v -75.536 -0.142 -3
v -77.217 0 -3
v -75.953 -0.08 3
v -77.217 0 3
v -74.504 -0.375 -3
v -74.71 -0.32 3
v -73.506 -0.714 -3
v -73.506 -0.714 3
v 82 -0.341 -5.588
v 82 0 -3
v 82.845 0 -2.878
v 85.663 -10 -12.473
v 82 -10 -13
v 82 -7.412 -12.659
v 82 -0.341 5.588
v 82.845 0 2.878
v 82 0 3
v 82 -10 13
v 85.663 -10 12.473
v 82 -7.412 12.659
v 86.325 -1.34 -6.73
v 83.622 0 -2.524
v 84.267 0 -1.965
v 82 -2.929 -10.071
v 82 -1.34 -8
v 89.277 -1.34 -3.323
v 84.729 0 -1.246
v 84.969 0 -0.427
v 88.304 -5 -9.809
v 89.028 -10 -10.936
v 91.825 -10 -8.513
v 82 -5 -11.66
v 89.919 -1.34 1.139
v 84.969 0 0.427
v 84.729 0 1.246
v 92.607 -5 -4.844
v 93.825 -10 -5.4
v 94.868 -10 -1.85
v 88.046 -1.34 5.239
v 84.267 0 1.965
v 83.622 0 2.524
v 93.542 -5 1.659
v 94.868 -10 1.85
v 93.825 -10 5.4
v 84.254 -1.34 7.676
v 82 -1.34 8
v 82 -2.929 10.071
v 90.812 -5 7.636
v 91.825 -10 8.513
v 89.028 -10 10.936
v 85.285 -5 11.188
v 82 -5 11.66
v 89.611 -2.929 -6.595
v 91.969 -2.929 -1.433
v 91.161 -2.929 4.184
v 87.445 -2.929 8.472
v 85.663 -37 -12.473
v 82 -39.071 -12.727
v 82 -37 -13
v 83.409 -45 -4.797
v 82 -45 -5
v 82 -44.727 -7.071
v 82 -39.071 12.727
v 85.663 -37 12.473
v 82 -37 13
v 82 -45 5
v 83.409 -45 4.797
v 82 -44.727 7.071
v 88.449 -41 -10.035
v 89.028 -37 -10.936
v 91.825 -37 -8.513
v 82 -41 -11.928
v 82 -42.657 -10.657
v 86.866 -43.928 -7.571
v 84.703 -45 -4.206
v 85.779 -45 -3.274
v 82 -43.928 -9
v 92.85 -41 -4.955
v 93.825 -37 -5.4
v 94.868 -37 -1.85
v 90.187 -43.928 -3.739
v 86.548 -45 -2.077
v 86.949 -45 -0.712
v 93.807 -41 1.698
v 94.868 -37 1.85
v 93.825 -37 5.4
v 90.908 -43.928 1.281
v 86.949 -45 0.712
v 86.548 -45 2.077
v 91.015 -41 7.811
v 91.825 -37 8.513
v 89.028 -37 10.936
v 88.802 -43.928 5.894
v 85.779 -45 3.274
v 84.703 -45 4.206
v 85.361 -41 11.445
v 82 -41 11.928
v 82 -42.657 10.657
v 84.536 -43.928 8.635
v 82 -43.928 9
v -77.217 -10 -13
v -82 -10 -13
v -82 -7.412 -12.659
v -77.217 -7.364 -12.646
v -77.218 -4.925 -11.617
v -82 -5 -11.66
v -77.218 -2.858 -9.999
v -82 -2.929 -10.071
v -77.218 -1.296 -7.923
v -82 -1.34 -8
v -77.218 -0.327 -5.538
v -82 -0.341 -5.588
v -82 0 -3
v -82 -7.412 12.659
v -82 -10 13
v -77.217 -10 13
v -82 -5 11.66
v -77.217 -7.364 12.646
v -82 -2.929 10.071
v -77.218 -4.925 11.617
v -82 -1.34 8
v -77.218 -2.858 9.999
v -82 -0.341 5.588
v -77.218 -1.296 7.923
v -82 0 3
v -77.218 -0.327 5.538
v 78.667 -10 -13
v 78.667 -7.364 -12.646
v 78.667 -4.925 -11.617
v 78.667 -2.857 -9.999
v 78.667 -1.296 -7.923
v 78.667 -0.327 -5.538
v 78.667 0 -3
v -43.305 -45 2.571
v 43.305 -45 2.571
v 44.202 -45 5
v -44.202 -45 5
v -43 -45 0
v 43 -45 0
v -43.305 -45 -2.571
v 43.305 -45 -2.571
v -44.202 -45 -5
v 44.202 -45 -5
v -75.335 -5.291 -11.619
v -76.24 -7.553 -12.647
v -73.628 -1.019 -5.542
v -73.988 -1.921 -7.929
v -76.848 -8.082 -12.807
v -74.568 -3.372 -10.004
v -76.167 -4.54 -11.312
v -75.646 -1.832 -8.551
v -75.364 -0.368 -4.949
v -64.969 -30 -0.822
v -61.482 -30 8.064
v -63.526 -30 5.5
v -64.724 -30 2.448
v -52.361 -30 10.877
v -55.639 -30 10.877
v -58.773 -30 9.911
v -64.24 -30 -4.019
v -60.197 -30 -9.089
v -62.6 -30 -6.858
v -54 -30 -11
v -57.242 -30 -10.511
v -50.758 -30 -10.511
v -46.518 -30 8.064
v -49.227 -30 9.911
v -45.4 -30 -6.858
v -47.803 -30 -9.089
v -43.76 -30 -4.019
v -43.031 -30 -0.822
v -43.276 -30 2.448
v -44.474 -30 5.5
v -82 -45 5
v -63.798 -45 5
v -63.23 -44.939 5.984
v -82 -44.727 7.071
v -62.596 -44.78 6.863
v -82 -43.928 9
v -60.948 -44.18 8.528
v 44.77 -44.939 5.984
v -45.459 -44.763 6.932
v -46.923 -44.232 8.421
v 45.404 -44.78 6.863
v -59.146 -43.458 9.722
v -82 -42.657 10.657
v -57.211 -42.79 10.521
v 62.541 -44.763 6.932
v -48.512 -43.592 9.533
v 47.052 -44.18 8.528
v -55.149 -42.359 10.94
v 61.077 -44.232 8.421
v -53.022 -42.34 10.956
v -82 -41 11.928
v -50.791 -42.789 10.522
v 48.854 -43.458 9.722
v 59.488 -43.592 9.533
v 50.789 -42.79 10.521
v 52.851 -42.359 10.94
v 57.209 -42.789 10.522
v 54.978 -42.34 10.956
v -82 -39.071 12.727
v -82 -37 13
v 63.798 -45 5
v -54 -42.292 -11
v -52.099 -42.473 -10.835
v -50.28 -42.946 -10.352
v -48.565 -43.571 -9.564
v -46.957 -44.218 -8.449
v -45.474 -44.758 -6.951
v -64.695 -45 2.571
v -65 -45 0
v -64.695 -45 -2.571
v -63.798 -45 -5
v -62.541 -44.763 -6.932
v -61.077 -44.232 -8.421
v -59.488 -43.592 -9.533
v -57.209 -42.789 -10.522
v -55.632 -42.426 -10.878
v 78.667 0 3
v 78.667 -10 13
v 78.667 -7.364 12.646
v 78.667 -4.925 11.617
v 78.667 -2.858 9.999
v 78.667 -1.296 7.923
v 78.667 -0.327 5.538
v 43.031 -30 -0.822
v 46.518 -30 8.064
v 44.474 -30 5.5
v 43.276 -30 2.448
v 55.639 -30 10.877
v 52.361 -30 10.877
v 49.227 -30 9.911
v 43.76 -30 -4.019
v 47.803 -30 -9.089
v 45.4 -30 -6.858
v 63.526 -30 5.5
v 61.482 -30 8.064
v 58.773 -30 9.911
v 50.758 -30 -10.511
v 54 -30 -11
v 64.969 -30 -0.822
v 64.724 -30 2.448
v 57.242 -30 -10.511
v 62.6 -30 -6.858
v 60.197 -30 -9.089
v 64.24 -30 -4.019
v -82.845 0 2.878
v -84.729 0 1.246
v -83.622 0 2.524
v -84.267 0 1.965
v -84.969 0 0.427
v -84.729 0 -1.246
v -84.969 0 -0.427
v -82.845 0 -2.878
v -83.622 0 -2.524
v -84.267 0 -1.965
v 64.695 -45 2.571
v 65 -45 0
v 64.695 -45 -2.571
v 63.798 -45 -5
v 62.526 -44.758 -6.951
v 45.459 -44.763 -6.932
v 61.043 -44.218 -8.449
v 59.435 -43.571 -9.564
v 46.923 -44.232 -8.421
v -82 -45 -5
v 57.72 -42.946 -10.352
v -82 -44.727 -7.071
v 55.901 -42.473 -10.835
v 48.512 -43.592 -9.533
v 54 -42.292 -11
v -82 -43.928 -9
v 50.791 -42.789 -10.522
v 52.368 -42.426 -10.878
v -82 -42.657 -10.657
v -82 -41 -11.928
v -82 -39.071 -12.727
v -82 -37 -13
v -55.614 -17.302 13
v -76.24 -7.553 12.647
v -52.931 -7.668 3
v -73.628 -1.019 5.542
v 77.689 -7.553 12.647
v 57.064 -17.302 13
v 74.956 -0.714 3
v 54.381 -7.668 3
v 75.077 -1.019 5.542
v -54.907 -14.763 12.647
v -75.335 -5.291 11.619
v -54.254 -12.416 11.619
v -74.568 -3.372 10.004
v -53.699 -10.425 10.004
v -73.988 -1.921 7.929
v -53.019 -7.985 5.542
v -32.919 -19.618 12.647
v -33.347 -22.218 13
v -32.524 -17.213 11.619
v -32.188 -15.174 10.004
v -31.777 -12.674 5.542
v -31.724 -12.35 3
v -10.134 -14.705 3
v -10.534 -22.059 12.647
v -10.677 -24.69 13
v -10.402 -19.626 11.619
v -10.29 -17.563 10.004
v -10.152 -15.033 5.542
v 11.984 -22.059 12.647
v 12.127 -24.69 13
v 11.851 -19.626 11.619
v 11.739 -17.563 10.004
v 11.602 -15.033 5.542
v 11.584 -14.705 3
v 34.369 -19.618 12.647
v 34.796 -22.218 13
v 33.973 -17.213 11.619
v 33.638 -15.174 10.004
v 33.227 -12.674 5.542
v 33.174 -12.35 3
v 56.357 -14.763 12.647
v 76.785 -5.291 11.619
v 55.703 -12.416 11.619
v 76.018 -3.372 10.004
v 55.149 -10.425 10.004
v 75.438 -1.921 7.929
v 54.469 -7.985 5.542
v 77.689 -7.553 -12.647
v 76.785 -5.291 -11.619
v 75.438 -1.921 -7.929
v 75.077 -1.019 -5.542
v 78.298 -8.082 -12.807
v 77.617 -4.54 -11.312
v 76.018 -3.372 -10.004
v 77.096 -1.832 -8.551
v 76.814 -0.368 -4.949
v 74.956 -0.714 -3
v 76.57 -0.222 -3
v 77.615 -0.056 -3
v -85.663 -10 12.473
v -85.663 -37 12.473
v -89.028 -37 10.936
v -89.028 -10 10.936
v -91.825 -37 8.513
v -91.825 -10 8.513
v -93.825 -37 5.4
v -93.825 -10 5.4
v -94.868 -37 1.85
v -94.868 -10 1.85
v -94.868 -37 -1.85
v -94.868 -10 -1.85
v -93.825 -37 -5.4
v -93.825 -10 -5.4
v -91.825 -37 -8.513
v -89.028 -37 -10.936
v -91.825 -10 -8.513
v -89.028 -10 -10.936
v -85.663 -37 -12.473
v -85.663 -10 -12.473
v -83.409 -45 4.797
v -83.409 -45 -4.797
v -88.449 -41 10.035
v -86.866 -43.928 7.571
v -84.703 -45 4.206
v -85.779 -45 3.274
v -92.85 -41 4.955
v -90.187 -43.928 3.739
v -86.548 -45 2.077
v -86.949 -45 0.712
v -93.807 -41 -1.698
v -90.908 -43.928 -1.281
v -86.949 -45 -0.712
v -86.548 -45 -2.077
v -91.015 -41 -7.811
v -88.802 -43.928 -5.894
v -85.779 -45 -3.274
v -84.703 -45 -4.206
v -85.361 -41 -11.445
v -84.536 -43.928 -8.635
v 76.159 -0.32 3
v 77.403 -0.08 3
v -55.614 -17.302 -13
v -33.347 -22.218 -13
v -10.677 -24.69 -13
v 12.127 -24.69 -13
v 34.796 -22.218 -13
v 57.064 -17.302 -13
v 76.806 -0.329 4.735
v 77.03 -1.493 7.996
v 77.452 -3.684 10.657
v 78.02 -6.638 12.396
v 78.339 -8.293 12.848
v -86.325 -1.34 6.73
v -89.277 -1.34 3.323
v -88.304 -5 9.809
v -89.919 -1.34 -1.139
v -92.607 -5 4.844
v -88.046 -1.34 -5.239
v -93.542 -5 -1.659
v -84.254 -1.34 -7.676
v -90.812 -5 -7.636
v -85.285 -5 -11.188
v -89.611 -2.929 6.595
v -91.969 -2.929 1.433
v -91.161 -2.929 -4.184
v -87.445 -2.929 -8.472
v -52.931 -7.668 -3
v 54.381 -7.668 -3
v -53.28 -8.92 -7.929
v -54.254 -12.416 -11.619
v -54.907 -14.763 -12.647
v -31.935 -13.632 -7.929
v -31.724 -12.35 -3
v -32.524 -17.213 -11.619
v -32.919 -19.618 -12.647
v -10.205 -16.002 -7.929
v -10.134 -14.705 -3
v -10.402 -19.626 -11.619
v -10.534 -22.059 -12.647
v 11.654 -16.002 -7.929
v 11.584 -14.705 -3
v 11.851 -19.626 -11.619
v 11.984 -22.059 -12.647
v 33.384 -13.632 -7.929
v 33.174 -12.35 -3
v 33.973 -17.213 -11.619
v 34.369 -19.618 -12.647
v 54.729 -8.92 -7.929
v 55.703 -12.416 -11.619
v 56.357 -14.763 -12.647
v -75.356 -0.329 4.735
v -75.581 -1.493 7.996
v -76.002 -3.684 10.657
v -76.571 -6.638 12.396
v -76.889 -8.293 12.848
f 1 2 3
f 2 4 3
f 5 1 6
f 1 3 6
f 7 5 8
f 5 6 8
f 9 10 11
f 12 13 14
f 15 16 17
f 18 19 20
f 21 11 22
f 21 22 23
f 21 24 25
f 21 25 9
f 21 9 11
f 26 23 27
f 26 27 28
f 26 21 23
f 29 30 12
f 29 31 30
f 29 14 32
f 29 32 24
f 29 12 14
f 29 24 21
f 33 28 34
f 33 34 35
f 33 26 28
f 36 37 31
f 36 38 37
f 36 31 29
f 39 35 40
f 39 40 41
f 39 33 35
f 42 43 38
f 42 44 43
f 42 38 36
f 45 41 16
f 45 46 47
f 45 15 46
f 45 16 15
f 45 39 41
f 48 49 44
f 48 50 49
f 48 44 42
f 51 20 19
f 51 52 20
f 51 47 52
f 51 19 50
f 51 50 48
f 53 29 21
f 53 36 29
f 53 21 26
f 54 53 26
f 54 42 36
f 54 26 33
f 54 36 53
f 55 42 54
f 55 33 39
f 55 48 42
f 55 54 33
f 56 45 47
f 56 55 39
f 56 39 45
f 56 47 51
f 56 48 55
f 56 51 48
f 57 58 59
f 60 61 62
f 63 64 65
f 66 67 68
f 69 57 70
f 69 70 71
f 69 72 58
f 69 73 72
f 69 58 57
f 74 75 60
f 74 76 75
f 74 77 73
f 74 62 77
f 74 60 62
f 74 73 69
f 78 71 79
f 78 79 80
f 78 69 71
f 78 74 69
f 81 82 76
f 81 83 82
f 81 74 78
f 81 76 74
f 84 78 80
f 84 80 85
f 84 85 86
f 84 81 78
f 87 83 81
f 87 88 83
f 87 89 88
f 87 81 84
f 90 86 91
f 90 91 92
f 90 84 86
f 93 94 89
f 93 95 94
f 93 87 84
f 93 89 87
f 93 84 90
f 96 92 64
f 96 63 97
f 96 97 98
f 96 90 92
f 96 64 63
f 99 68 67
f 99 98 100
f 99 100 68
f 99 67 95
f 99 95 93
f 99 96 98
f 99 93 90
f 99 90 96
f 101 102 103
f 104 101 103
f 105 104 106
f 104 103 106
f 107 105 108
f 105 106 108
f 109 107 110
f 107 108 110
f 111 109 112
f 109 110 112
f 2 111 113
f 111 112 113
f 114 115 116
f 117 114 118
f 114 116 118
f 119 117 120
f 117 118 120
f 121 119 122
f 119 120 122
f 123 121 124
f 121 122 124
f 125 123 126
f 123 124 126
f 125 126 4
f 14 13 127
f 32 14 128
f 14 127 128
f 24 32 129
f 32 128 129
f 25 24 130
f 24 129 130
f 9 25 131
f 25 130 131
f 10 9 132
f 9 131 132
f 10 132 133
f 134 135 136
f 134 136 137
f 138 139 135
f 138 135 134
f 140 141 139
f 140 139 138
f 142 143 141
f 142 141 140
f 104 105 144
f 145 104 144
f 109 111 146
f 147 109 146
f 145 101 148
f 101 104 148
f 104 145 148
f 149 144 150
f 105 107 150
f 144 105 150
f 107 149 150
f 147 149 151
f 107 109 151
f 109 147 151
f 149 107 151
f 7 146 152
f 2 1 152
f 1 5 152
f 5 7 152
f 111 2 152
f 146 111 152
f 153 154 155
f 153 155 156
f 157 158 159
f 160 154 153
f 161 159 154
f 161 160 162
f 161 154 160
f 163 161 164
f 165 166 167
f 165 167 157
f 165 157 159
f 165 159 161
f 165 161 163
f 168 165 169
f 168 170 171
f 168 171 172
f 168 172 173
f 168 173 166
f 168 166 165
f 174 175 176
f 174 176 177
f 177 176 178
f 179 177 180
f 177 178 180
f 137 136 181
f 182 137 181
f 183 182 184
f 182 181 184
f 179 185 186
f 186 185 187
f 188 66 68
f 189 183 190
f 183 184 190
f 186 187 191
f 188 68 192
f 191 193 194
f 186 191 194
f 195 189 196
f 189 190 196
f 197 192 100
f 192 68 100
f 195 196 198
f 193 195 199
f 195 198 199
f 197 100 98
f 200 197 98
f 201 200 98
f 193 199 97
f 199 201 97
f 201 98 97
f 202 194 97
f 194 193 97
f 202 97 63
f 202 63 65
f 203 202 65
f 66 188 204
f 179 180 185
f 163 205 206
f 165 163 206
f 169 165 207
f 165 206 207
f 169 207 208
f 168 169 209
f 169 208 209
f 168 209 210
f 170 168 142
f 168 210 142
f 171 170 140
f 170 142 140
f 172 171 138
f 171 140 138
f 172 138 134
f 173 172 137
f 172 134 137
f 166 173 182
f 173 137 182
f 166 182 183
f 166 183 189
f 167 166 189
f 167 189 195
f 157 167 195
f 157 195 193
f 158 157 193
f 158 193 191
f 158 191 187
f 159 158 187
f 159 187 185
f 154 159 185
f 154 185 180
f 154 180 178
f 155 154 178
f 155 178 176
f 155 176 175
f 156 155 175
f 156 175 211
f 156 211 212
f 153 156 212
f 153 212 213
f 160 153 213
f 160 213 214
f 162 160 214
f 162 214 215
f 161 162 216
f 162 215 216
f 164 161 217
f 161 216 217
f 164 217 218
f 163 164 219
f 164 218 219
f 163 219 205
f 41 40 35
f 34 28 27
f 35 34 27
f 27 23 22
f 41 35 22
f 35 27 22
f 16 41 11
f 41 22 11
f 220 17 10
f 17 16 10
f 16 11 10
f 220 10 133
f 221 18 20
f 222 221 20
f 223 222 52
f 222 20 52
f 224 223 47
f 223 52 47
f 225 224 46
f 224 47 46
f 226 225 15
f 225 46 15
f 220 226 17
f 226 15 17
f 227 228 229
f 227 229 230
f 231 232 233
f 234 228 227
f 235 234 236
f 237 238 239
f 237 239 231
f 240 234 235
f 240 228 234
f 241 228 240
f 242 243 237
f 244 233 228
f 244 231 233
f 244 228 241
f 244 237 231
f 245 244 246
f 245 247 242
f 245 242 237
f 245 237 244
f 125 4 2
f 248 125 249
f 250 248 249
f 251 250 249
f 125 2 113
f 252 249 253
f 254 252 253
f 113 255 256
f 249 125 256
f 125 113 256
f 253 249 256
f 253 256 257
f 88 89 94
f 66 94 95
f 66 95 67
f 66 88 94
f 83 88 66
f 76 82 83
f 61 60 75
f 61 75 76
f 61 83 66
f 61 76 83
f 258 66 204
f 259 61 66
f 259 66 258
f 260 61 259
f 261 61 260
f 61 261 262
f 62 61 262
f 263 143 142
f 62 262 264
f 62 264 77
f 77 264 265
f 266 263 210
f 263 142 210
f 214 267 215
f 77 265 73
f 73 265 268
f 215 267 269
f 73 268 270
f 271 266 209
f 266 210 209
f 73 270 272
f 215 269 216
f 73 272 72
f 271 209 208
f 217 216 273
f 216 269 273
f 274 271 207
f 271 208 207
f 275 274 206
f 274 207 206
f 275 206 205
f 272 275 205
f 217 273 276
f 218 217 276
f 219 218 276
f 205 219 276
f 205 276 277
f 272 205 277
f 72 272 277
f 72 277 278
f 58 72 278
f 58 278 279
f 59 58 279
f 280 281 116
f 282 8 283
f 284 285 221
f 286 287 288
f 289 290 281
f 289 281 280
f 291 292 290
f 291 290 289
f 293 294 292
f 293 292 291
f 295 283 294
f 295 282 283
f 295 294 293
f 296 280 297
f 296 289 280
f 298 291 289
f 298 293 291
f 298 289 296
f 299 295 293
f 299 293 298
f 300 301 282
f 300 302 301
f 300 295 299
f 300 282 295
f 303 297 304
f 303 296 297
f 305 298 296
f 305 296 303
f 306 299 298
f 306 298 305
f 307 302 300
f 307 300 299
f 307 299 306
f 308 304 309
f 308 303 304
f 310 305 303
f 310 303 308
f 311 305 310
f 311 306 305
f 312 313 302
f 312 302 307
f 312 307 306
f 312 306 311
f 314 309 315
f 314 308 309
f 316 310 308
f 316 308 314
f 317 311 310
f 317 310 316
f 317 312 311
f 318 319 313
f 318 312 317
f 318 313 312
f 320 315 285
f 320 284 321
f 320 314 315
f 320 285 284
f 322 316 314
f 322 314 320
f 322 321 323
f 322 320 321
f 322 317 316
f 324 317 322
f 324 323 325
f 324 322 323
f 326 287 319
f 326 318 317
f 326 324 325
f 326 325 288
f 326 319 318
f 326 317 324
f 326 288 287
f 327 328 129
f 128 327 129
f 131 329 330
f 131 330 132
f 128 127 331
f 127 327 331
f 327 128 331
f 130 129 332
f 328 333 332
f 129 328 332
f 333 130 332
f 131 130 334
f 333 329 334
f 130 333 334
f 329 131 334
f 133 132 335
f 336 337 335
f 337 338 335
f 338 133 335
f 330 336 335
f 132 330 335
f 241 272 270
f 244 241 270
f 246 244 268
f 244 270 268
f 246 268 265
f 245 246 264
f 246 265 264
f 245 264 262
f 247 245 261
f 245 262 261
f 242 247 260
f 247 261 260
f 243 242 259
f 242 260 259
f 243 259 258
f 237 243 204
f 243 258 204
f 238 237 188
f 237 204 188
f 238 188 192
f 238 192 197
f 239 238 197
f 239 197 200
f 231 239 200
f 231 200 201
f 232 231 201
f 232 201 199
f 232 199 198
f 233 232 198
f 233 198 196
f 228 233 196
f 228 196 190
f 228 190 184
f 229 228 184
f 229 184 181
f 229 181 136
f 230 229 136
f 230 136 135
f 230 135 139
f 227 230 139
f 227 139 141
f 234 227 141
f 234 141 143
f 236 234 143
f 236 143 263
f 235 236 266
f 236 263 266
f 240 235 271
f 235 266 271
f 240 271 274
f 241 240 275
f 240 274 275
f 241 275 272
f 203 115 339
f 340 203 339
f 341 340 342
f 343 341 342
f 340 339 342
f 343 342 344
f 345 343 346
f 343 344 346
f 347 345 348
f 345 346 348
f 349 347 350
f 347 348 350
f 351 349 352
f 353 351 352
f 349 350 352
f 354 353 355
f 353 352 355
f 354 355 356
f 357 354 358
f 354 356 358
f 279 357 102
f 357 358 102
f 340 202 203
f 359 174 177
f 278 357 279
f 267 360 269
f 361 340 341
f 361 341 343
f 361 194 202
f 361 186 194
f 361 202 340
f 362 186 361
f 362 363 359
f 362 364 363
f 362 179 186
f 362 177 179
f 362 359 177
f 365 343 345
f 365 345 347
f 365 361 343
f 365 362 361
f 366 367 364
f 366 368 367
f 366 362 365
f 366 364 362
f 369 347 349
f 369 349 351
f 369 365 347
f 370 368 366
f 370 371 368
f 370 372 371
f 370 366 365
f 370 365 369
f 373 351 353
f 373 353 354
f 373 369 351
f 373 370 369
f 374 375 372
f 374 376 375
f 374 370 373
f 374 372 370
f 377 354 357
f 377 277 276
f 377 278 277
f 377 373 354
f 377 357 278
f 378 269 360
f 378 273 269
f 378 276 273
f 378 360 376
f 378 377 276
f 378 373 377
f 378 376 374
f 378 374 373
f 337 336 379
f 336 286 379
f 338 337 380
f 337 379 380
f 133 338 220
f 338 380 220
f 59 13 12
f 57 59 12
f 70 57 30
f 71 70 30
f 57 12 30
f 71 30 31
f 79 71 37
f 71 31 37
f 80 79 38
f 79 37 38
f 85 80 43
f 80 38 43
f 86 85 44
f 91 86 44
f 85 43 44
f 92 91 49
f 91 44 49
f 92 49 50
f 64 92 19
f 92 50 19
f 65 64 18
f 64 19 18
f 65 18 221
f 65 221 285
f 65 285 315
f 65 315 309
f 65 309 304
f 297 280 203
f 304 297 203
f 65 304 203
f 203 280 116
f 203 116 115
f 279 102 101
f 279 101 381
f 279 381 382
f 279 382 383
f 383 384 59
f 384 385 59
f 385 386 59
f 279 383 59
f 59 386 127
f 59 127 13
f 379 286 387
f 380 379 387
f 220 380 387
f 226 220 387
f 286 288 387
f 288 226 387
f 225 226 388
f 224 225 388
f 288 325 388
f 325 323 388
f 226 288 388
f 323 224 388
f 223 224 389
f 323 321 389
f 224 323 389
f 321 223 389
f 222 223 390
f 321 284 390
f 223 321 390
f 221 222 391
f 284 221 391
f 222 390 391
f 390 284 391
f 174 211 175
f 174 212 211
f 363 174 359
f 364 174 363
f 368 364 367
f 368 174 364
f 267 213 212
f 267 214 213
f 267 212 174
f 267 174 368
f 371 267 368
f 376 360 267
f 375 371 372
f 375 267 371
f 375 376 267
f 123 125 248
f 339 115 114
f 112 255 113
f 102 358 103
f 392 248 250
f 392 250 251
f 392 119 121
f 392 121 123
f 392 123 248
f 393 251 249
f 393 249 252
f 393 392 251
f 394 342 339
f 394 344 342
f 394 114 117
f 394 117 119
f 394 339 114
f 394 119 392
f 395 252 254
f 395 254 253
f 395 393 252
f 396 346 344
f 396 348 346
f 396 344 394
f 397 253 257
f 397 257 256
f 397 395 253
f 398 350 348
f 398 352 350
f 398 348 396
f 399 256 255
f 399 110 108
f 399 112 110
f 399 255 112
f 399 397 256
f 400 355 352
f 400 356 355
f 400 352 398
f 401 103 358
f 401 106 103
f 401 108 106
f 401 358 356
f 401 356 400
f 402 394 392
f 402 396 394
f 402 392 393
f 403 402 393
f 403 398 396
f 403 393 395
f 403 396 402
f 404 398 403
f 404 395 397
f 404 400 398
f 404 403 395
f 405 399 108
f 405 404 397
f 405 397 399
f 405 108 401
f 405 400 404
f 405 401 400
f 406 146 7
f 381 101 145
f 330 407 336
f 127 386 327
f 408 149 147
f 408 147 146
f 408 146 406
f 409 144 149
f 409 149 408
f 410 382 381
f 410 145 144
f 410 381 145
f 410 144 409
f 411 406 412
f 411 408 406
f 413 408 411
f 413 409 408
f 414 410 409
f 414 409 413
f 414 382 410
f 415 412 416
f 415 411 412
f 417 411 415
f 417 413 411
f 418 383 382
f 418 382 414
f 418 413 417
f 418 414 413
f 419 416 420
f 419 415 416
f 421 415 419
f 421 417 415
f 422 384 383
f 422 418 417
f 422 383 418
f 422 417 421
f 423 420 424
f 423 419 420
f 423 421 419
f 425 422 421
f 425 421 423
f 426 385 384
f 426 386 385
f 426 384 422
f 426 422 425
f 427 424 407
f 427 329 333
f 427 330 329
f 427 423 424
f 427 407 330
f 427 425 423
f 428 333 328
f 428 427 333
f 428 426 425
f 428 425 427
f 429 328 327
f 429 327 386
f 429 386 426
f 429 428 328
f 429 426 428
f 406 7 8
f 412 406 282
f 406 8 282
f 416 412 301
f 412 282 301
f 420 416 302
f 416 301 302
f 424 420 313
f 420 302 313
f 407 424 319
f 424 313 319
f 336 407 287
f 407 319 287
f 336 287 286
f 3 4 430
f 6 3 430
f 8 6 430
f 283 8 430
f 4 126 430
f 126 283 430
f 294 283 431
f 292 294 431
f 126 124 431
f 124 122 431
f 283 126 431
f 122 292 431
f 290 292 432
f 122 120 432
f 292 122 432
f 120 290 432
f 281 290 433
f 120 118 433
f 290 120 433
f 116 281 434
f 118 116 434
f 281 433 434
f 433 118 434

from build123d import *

# Parameters (mm, degrees)
BOSS_EXTRUDE1_DEPTH = 45
SKETCH2_R           = 11
CUT_EXTRUDE1_DEPTH  = 15
SKETCH4_R           = 200
CUT_EXTRUDE2_DEPTH  = 17.5
FILLET1_R           = 8
FILLET2_R           = 10
FILLET3_R           = 10


with BuildPart() as part:
    # Sketch1 → Boss-Extrude1 (new body)
    with BuildSketch(Plane(origin=(0, 0, 0), x_dir=(1, 0, 0), z_dir=(0, 1, 0))):
        with BuildLine():
            Line((-82, 13), (82, 13))
            ThreePointArc((82, 13), (95, 0), (82, -13))
            Line((82, -13), (-82, -13))
            ThreePointArc((-82, -13), (-95, 0), (-82, 13))
        make_face()
    extrude(amount=-BOSS_EXTRUDE1_DEPTH)

    # Sketch2 → Cut-Extrude1 (cut)
    with BuildSketch(Plane.XZ.offset(45)):
        with Locations(Location((-54, 0, 0), (0, 0, 270))):
            Circle(SKETCH2_R)
        with Locations(Location((54, 0, 0), (0, 0, 270))):
            Circle(SKETCH2_R)
    extrude(amount=-CUT_EXTRUDE1_DEPTH, mode=Mode.SUBTRACT)

    # Sketch4 → Cut-Extrude2 (cut, symmetric)
    with BuildSketch(Plane.XY):
        with Locations((0.724830201, 185)):
            Circle(SKETCH4_R)
    extrude(amount=CUT_EXTRUDE2_DEPTH, both=True, mode=Mode.SUBTRACT)

    # Fillet1
    # the kernel refuses this fillet: 8 mm, written as the material it takes off along each edge
    with BuildSketch(Plane(origin=(82, -45, 0), x_dir=(0, 0, -1), z_dir=(-1, 0, 0))) as fillet1_piece_1:
        with BuildLine():
            CenterArc((13 - FILLET1_R, -FILLET1_R), FILLET1_R, 0, 90)
            Line((13, -FILLET1_R), (13, 0))
            Line((13, 0), (13 - FILLET1_R, 0))
        make_face()
    revolve(axis=Axis((82, -45, 0), (0, -1, 0)), revolution_arc=180, mode=Mode.SUBTRACT)
    with BuildSketch(Plane(origin=(-82, -45, -13), x_dir=(0, 0, 1), z_dir=(1, 0, 0))) as fillet1_piece_2:
        with BuildLine():
            CenterArc((FILLET1_R, -FILLET1_R), FILLET1_R, 90, 90)
            Line((0, -FILLET1_R), (0, 0))
            Line((0, 0), (FILLET1_R, 0))
        make_face()
    extrude(amount=164, mode=Mode.SUBTRACT)
    with BuildSketch(Plane(origin=(-82, -45, 0), x_dir=(0, 0, 1), z_dir=(1, 0, 0))) as fillet1_piece_3:
        with BuildLine():
            CenterArc((13 - FILLET1_R, -FILLET1_R), FILLET1_R, 0, 90)
            Line((13 - FILLET1_R, 0), (13, 0))
            Line((13, 0), (13, -FILLET1_R))
        make_face()
    revolve(axis=Axis((-82, -45, 0), (0, -1, 0)), revolution_arc=180, mode=Mode.SUBTRACT)
    with BuildSketch(Plane(origin=(82, -45, 13), x_dir=(0, 1, 0), z_dir=(-1, 0, 0))) as fillet1_piece_4:
        with BuildLine():
            CenterArc((FILLET1_R, FILLET1_R), FILLET1_R, 180, 90)
            Line((0, FILLET1_R), (0, 0))
            Line((0, 0), (FILLET1_R, 0))
        make_face()
    extrude(amount=164, mode=Mode.SUBTRACT)

    # Fillet2
    # the kernel refuses this fillet: 10 mm, written as the material it takes off along each edge
    with BuildSketch(Plane(origin=(82, 0, 13), x_dir=(0, -1, 0), z_dir=(-1, 0, 0))) as fillet2_piece_1:
        with BuildLine():
            CenterArc((FILLET2_R, -FILLET2_R), FILLET2_R, 90, 90)
            Line((0, -FILLET2_R), (0, 0))
            Line((0, 0), (FILLET2_R, 0))
        make_face()
    extrude(amount=30.281749031, mode=Mode.SUBTRACT)
    with BuildSketch(Plane(origin=(-82, 0, -13), x_dir=(0, 0, 1), z_dir=(1, 0, 0))) as fillet2_piece_2:
        with BuildLine():
            CenterArc((FILLET2_R, FILLET2_R), FILLET2_R, 180, 90)
            Line((0, FILLET2_R), (0, 0))
            Line((0, 0), (FILLET2_R, 0))
        make_face()
    extrude(amount=31.731409434, mode=Mode.SUBTRACT)
    with BuildSketch(Plane(origin=(0.724830201, 185, -13), x_dir=(-0.49233736380683973, -0.8704044578239082, 0), z_dir=(-0.8704044578239082, 0.49233736380683973, 0))) as fillet2_piece_3:
        with BuildLine():
            CenterArc((200 + FILLET2_R, FILLET2_R), FILLET2_R, 180, 90)
            Line((200 + FILLET2_R, 0), (200, 0))
            Line((200, 0), (200, FILLET2_R))
        make_face()
    revolve(axis=Axis((0.724830201, 185, -13), (0, 0, 1)), revolution_arc=58.988651661, mode=Mode.SUBTRACT)
    with BuildSketch(Plane(origin=(0.724830201, 185, 13), x_dir=(-0.49233736380683973, -0.8704044578239082, 0), z_dir=(-0.8704044578239082, 0.49233736380683973, 0))) as fillet2_piece_4:
        with BuildLine():
            CenterArc((200 + FILLET2_R, -FILLET2_R), FILLET2_R, 90, 90)
            Line((200, -FILLET2_R), (200, 0))
            Line((200, 0), (200 + FILLET2_R, 0))
        make_face()
    revolve(axis=Axis((0.724830201, 185, 13), (0, 0, 1)), revolution_arc=58.988651661, mode=Mode.SUBTRACT)
    with BuildSketch(Plane(origin=(51.718250969, 0, -13), x_dir=(0, 0, 1), z_dir=(1, 0, 0))) as fillet2_piece_5:
        with BuildLine():
            CenterArc((FILLET2_R, FILLET2_R), FILLET2_R, 180, 90)
            Line((0, FILLET2_R), (0, 0))
            Line((0, 0), (FILLET2_R, 0))
        make_face()
    extrude(amount=30.281749031, mode=Mode.SUBTRACT)
    with BuildSketch(Plane(origin=(82, 0, 0), x_dir=(0, 0, -1), z_dir=(-1, 0, 0))) as fillet2_piece_6:
        with BuildLine():
            CenterArc((13 - FILLET2_R, FILLET2_R), FILLET2_R, 270, 90)
            Line((13, FILLET2_R), (13, 0))
            Line((13, 0), (13 - FILLET2_R, 0))
        make_face()
    revolve(axis=Axis((82, 0, 0), (0, -1, 0)), revolution_arc=180, mode=Mode.SUBTRACT)
    with BuildSketch(Plane(origin=(-50.268590566, 0, 13), x_dir=(0, -1, 0), z_dir=(-1, 0, 0))) as fillet2_piece_7:
        with BuildLine():
            CenterArc((FILLET2_R, -FILLET2_R), FILLET2_R, 90, 90)
            Line((0, -FILLET2_R), (0, 0))
            Line((0, 0), (FILLET2_R, 0))
        make_face()
    extrude(amount=31.731409434, mode=Mode.SUBTRACT)
    with BuildSketch(Plane(origin=(-82, 0, 0), x_dir=(0, 0, 1), z_dir=(1, 0, 0))) as fillet2_piece_8:
        with BuildLine():
            CenterArc((13 - FILLET2_R, FILLET2_R), FILLET2_R, 270, 90)
            Line((13, FILLET2_R), (13, 0))
            Line((13, 0), (13 - FILLET2_R, 0))
        make_face()
    revolve(axis=Axis((-82, 0, 0), (0, -1, 0)), revolution_arc=180, mode=Mode.SUBTRACT)

    # Fillet3
    fillet3_edges = [part.edges().sort_by_distance(p)[0] for p in [
        (-75.268590566, 0, 0),
        (76.718250969, 0, 0),
        (77.300565536, -2.961441402, 10.103428202),
        (-75.850905134, -2.961441403, 10.103428203),
        (77.300565536, -2.961441402, -10.103428202),
        (-75.850905134, -2.961441403, -10.103428203),
    ]]
    fillet(fillet3_edges, radius=FILLET3_R)


solid = part.part
